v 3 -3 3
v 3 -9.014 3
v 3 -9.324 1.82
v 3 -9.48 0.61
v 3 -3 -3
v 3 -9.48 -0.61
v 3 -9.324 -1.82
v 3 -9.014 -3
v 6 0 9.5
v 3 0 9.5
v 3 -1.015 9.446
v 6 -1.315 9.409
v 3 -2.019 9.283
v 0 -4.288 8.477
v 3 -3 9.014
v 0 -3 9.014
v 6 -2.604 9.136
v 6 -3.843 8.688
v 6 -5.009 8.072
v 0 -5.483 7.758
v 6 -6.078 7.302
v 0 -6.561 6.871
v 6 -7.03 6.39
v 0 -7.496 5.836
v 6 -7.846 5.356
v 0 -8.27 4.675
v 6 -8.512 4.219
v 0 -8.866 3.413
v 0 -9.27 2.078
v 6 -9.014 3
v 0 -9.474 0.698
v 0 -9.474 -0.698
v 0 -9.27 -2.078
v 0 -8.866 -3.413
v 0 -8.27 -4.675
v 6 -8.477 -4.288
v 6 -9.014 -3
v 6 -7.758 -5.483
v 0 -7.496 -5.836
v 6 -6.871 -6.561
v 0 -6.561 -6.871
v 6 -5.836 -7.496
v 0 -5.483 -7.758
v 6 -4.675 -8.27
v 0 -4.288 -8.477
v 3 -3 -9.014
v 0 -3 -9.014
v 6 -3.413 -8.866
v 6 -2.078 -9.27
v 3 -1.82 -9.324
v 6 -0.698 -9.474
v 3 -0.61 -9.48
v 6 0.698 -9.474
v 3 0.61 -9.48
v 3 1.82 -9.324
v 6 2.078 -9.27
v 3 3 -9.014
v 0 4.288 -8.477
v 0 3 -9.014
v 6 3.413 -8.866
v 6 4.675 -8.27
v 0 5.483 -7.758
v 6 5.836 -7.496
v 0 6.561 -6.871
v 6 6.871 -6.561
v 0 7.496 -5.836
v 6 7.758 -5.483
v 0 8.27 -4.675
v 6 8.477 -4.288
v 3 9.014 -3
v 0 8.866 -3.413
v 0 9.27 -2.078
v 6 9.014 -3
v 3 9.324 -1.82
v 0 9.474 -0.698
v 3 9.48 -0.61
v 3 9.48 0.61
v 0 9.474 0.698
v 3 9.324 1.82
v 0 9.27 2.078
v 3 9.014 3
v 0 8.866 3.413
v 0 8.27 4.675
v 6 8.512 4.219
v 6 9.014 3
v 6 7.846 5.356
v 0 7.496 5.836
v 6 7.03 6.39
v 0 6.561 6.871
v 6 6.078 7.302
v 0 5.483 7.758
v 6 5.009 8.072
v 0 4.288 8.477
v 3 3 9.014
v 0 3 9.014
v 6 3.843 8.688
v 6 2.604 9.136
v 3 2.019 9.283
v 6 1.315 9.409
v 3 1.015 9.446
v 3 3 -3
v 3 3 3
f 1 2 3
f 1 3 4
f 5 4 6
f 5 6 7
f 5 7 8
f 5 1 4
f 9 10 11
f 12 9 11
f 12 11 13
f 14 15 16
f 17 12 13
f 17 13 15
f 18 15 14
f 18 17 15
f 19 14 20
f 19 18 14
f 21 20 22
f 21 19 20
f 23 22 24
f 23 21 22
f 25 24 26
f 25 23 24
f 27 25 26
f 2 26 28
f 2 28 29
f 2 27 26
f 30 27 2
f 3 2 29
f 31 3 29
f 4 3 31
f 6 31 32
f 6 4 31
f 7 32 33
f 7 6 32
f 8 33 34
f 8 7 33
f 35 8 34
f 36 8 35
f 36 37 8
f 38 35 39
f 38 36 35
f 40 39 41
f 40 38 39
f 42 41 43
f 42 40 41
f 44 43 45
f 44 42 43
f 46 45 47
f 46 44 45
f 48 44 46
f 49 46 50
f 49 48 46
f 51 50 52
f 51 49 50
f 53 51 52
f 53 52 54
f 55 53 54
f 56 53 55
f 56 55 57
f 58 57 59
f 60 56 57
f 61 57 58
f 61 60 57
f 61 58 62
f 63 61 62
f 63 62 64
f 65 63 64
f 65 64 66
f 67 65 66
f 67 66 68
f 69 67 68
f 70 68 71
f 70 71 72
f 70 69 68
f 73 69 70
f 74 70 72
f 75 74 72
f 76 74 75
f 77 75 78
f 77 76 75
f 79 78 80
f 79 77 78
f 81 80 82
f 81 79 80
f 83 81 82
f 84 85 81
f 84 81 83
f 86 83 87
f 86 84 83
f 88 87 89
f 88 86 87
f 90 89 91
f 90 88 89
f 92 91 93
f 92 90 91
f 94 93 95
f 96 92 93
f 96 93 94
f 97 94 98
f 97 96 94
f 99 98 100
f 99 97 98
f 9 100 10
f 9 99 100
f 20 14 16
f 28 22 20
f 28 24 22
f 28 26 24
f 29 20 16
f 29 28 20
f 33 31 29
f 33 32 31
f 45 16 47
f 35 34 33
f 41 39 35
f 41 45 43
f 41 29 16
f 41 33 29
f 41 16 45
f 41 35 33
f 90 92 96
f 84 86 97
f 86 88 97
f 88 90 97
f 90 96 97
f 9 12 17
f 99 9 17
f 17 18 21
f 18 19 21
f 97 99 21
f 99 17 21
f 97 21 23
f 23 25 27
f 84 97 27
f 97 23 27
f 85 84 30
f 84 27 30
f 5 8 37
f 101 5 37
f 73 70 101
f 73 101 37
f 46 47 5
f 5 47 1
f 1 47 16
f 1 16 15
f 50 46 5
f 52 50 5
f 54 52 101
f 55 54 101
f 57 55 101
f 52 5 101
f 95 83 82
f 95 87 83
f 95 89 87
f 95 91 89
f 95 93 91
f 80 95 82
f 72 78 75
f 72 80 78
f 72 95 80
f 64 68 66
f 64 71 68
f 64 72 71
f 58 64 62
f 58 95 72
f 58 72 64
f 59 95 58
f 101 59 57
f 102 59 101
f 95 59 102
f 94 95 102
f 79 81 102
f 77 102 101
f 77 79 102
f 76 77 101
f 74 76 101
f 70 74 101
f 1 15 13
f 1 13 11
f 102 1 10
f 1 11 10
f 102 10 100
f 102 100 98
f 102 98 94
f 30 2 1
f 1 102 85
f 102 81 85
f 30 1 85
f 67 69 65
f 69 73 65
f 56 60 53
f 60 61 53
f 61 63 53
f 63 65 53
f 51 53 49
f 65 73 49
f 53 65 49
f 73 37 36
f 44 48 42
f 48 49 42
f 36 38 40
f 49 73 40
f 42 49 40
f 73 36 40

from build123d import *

# Parameters (mm, degrees)
ESQUISSE1_W             = 6
ESQUISSE1_H             = 9.5
ESQUISSE2_W             = 3
ESQUISSE2_H             = 6
ENL_V_MAT_EXTRU_1_DEPTH = 10
ESQUISSE3_W             = 3
ESQUISSE3_H             = 6
ENL_V_MAT_EXTRU_2_DEPTH = 10


with BuildPart() as part:
    # Esquisse1 → Base-Révolution (revolve)
    with BuildSketch(Plane.XY, mode=Mode.PRIVATE) as base_r_volution_sk:
        with Locations((3, 4.75)):
            Rectangle(ESQUISSE1_W, ESQUISSE1_H)
    revolve(base_r_volution_sk.sketch.rotate(Axis((0, 0, 0), (1, 0, 0)), 90), axis=Axis((0, 0, 0), (1, 0, 0)))

    # Esquisse2 → Enlèv. mat.-Extru.1 (cut, symmetric)
    with BuildSketch(Plane.XY):
        with Locations((1.5, 0)):
            Rectangle(ESQUISSE2_W, ESQUISSE2_H)
    extrude(amount=ENL_V_MAT_EXTRU_1_DEPTH, both=True, mode=Mode.SUBTRACT)

    # Esquisse3 → Enlèv. mat.-Extru.2 (cut, symmetric)
    with BuildSketch(Plane(origin=(0, 0, 0), x_dir=(1, 0, 0), z_dir=(0, 1, 0))):
        with Locations((4.5, 0)):
            Rectangle(ESQUISSE3_W, ESQUISSE3_H)
    extrude(amount=ENL_V_MAT_EXTRU_2_DEPTH, both=True, mode=Mode.SUBTRACT)


solid = part.part
